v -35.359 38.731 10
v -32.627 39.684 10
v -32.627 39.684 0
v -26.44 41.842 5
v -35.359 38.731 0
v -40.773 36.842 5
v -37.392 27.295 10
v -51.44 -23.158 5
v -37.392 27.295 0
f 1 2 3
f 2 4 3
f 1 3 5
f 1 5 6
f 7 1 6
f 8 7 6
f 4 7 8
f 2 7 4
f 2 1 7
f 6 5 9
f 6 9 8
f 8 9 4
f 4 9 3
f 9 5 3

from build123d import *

# Parameters (mm, degrees)
F1_DEPTH = 10
F2_SIZE  = 4.99999


# Not quite as in the source:
# - a fillet or chamfer is up to 0.001 mm smaller than in the source, because OpenCascade refuses the exact size


with BuildPart() as f1:
    # F0 (on Top) → F1 (new body)
    with BuildSketch(Plane.XY):
        Polygon((-26.4395750973, 41.8424181081), (-40.7729081464, 36.8424181081), (-51.4395743695, -23.1575818919), align=None)
    extrude(amount=F1_DEPTH)

    # F2 (size 5 in the source; OpenCascade refuses exactly that, so slightly less here)
    f2_edges = [f1.edges().sort_by_distance(p)[0] for p in [
        (-46.106241, 6.842418, 10),
        (-38.939575, 9.342418, 10),
        (-46.106241, 6.842418, 0),
        (-38.939575, 9.342418, 0),
    ]]
    chamfer(f2_edges, length=F2_SIZE)


solid = f1.part
